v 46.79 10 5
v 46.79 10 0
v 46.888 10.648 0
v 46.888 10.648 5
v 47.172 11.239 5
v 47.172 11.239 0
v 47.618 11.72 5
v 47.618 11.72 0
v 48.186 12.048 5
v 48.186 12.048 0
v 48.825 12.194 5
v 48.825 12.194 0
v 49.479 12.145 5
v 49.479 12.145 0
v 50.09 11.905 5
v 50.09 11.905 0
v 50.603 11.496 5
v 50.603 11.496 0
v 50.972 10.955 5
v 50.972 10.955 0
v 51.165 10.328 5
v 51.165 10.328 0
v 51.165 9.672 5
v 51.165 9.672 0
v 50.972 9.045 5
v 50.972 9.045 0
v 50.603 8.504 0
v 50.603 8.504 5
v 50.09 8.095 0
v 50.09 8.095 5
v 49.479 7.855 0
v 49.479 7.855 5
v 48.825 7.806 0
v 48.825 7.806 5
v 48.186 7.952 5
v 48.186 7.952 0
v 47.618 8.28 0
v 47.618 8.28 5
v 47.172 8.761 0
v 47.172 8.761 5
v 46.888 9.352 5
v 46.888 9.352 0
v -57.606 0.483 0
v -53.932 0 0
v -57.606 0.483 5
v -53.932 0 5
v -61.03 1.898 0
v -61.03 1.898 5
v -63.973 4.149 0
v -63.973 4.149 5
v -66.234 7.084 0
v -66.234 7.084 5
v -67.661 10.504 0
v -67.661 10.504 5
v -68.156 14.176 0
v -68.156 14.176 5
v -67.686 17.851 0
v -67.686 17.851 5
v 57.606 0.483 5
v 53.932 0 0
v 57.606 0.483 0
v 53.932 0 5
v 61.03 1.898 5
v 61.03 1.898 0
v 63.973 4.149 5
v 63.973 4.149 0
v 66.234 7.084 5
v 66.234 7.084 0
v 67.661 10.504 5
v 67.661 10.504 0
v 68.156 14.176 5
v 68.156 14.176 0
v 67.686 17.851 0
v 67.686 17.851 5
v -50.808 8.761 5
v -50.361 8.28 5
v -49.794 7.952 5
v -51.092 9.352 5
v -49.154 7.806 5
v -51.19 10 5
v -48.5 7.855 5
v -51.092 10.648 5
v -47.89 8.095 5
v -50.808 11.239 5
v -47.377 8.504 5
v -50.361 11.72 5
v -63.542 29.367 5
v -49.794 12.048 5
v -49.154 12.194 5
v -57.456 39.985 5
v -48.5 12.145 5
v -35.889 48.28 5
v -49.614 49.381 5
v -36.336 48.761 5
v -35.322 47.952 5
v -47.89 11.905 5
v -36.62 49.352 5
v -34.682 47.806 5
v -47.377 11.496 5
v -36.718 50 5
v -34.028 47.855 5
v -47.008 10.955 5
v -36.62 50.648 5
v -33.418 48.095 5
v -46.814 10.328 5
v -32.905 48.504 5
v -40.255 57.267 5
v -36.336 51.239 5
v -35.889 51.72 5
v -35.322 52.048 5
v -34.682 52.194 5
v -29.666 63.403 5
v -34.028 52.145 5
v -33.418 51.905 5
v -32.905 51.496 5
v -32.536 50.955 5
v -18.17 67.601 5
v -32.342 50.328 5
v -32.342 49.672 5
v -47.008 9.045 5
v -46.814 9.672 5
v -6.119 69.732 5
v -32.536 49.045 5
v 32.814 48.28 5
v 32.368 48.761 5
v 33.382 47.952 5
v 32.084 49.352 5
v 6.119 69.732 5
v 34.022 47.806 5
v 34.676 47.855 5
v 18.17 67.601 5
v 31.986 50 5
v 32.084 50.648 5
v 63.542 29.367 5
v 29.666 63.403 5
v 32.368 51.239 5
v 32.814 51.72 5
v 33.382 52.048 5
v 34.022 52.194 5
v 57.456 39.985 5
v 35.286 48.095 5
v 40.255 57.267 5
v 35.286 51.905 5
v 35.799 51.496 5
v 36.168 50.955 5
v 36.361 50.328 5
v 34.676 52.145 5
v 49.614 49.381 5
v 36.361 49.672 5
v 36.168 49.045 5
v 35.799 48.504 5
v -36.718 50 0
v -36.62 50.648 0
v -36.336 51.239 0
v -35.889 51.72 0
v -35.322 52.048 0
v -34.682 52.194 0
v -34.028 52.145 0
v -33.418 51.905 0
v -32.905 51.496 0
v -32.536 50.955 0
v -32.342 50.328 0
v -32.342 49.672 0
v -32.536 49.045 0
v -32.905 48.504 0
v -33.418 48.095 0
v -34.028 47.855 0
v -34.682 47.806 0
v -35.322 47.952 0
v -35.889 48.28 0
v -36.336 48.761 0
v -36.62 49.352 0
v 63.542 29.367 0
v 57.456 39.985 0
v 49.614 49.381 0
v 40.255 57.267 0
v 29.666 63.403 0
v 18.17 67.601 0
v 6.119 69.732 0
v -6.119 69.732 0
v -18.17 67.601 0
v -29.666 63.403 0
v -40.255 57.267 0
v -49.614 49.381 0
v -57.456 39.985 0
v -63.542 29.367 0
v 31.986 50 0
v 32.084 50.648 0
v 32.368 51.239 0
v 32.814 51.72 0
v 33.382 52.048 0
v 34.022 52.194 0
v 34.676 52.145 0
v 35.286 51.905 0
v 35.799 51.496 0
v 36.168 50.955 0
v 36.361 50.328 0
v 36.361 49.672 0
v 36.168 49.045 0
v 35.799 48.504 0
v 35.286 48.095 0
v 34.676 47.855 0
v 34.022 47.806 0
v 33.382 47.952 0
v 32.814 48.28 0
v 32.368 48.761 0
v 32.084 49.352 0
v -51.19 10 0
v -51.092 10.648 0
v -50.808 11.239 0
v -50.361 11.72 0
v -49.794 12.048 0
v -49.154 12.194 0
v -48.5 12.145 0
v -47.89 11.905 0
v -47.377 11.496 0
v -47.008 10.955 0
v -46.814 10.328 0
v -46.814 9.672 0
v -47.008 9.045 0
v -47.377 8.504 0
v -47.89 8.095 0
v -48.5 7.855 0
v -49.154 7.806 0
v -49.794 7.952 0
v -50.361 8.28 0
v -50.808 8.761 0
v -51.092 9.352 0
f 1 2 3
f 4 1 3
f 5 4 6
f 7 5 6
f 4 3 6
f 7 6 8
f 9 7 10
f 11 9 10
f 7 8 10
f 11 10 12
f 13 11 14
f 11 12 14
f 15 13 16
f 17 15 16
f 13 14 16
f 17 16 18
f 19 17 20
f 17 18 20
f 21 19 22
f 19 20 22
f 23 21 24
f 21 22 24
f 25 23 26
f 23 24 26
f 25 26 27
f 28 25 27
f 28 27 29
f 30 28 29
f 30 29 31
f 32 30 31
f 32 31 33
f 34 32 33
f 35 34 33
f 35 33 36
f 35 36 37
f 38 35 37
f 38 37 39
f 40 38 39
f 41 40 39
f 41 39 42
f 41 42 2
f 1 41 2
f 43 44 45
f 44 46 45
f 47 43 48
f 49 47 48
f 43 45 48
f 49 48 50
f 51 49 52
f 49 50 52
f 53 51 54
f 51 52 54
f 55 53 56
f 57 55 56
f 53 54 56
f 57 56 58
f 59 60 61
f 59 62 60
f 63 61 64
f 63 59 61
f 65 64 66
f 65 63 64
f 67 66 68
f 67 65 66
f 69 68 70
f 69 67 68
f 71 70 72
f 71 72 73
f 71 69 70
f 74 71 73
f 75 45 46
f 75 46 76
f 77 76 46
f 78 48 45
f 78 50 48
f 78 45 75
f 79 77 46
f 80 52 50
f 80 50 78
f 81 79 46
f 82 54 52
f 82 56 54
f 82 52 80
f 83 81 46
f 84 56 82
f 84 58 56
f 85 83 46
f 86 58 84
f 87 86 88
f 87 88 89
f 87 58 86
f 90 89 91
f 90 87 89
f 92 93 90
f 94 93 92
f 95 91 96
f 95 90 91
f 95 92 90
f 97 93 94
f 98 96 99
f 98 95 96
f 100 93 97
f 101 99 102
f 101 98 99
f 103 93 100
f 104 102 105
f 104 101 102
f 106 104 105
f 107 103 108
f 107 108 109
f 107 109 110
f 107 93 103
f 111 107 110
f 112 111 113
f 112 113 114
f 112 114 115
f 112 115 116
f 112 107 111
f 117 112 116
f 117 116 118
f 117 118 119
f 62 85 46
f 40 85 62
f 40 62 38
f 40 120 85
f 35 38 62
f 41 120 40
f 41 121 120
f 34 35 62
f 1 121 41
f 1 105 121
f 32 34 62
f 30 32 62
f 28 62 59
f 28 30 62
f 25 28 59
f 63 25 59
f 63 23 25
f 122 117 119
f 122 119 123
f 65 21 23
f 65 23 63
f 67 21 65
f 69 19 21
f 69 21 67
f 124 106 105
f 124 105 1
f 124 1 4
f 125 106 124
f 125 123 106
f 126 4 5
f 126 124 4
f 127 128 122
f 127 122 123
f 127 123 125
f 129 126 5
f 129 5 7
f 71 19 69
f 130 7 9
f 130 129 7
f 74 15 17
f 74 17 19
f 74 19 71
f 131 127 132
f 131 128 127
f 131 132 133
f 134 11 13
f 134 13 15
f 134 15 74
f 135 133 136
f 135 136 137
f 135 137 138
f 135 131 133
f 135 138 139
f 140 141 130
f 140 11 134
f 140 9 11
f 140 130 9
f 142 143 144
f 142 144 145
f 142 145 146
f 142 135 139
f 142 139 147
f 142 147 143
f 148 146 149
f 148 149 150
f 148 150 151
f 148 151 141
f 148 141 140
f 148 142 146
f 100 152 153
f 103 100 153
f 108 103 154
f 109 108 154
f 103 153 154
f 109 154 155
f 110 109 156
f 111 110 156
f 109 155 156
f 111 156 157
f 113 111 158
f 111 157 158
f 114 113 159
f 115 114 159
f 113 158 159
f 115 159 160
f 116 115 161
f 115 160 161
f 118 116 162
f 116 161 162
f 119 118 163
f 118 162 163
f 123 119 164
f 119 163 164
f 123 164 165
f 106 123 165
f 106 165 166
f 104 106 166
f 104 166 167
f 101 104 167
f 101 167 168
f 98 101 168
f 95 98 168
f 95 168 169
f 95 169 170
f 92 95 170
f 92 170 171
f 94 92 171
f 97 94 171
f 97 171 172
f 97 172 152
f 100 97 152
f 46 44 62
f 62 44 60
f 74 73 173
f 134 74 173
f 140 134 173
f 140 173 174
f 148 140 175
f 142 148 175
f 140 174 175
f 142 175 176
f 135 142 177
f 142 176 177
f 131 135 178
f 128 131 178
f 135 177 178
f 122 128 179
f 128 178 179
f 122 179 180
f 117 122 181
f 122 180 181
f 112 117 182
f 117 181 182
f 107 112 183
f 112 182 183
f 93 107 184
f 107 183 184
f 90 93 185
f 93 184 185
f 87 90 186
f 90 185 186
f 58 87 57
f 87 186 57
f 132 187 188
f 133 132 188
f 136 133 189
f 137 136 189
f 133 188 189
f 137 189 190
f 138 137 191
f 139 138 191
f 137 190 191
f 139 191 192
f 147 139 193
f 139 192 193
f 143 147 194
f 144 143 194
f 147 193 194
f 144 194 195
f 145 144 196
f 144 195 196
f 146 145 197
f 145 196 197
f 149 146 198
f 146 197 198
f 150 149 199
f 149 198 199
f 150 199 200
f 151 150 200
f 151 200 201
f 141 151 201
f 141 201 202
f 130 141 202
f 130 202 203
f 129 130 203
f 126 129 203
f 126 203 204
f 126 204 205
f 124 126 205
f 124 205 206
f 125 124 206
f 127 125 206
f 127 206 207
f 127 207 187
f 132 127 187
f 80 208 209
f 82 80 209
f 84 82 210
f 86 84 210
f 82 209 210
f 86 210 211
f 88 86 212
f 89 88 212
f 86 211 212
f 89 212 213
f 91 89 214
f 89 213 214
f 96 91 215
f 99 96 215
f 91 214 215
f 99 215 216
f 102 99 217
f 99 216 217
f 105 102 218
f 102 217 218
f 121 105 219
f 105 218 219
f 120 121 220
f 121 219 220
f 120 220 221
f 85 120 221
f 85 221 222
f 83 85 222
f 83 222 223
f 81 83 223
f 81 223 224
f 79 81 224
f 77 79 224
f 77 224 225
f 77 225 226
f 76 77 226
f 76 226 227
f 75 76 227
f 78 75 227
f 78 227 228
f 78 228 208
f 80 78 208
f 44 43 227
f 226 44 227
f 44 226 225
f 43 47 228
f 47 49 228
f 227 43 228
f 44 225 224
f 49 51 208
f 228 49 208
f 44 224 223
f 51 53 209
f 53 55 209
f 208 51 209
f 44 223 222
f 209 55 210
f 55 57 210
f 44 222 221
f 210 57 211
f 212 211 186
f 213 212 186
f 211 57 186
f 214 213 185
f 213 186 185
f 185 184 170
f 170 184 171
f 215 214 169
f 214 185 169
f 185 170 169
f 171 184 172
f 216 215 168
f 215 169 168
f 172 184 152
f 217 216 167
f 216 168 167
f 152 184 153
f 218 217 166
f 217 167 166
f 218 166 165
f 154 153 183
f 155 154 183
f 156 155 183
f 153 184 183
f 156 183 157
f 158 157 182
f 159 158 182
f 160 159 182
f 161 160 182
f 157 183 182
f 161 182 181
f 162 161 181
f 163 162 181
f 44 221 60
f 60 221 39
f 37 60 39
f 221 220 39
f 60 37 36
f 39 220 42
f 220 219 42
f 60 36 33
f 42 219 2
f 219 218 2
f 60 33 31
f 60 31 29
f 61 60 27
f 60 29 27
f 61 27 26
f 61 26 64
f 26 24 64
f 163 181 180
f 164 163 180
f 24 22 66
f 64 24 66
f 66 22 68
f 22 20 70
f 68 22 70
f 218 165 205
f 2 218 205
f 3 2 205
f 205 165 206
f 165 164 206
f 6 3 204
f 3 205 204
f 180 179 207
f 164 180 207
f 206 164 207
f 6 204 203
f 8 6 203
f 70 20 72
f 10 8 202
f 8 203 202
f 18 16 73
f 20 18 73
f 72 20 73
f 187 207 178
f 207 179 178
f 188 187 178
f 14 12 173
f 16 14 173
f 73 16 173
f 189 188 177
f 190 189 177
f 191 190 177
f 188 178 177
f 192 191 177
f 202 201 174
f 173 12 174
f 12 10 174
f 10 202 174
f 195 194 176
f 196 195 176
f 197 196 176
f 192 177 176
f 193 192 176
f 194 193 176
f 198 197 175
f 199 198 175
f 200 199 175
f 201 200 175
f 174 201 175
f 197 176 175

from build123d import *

# Parameters (mm, degrees)
F1_DEPTH = 5
F3_D     = 4.4
F4_R     = 14.224


with BuildPart() as f1:
    # F0 (on Top) → F1 (new body)
    with BuildSketch(Plane.XY):
        with BuildLine():
            Line((-70, 0), (70, 0))
            ThreePointArc((70, 0), (0, 70), (-70, 0))
        make_face()
    extrude(amount=F1_DEPTH)

    # F3 (through all)
    with Locations(Plane.XY.offset(5)):
        with Locations((-34.5178022981, 50), (34.1860465705, 50), (48.9897948557, 10), (-48.9897948557, 10)):
            Hole(F3_D / 2)

    # F4
    f4_edges = [f1.edges().sort_by_distance(p)[0] for p in [
        (70, 0, 2.5),
        (-70, 0, 2.5),
    ]]
    fillet(f4_edges, radius=F4_R)


solid = f1.part
